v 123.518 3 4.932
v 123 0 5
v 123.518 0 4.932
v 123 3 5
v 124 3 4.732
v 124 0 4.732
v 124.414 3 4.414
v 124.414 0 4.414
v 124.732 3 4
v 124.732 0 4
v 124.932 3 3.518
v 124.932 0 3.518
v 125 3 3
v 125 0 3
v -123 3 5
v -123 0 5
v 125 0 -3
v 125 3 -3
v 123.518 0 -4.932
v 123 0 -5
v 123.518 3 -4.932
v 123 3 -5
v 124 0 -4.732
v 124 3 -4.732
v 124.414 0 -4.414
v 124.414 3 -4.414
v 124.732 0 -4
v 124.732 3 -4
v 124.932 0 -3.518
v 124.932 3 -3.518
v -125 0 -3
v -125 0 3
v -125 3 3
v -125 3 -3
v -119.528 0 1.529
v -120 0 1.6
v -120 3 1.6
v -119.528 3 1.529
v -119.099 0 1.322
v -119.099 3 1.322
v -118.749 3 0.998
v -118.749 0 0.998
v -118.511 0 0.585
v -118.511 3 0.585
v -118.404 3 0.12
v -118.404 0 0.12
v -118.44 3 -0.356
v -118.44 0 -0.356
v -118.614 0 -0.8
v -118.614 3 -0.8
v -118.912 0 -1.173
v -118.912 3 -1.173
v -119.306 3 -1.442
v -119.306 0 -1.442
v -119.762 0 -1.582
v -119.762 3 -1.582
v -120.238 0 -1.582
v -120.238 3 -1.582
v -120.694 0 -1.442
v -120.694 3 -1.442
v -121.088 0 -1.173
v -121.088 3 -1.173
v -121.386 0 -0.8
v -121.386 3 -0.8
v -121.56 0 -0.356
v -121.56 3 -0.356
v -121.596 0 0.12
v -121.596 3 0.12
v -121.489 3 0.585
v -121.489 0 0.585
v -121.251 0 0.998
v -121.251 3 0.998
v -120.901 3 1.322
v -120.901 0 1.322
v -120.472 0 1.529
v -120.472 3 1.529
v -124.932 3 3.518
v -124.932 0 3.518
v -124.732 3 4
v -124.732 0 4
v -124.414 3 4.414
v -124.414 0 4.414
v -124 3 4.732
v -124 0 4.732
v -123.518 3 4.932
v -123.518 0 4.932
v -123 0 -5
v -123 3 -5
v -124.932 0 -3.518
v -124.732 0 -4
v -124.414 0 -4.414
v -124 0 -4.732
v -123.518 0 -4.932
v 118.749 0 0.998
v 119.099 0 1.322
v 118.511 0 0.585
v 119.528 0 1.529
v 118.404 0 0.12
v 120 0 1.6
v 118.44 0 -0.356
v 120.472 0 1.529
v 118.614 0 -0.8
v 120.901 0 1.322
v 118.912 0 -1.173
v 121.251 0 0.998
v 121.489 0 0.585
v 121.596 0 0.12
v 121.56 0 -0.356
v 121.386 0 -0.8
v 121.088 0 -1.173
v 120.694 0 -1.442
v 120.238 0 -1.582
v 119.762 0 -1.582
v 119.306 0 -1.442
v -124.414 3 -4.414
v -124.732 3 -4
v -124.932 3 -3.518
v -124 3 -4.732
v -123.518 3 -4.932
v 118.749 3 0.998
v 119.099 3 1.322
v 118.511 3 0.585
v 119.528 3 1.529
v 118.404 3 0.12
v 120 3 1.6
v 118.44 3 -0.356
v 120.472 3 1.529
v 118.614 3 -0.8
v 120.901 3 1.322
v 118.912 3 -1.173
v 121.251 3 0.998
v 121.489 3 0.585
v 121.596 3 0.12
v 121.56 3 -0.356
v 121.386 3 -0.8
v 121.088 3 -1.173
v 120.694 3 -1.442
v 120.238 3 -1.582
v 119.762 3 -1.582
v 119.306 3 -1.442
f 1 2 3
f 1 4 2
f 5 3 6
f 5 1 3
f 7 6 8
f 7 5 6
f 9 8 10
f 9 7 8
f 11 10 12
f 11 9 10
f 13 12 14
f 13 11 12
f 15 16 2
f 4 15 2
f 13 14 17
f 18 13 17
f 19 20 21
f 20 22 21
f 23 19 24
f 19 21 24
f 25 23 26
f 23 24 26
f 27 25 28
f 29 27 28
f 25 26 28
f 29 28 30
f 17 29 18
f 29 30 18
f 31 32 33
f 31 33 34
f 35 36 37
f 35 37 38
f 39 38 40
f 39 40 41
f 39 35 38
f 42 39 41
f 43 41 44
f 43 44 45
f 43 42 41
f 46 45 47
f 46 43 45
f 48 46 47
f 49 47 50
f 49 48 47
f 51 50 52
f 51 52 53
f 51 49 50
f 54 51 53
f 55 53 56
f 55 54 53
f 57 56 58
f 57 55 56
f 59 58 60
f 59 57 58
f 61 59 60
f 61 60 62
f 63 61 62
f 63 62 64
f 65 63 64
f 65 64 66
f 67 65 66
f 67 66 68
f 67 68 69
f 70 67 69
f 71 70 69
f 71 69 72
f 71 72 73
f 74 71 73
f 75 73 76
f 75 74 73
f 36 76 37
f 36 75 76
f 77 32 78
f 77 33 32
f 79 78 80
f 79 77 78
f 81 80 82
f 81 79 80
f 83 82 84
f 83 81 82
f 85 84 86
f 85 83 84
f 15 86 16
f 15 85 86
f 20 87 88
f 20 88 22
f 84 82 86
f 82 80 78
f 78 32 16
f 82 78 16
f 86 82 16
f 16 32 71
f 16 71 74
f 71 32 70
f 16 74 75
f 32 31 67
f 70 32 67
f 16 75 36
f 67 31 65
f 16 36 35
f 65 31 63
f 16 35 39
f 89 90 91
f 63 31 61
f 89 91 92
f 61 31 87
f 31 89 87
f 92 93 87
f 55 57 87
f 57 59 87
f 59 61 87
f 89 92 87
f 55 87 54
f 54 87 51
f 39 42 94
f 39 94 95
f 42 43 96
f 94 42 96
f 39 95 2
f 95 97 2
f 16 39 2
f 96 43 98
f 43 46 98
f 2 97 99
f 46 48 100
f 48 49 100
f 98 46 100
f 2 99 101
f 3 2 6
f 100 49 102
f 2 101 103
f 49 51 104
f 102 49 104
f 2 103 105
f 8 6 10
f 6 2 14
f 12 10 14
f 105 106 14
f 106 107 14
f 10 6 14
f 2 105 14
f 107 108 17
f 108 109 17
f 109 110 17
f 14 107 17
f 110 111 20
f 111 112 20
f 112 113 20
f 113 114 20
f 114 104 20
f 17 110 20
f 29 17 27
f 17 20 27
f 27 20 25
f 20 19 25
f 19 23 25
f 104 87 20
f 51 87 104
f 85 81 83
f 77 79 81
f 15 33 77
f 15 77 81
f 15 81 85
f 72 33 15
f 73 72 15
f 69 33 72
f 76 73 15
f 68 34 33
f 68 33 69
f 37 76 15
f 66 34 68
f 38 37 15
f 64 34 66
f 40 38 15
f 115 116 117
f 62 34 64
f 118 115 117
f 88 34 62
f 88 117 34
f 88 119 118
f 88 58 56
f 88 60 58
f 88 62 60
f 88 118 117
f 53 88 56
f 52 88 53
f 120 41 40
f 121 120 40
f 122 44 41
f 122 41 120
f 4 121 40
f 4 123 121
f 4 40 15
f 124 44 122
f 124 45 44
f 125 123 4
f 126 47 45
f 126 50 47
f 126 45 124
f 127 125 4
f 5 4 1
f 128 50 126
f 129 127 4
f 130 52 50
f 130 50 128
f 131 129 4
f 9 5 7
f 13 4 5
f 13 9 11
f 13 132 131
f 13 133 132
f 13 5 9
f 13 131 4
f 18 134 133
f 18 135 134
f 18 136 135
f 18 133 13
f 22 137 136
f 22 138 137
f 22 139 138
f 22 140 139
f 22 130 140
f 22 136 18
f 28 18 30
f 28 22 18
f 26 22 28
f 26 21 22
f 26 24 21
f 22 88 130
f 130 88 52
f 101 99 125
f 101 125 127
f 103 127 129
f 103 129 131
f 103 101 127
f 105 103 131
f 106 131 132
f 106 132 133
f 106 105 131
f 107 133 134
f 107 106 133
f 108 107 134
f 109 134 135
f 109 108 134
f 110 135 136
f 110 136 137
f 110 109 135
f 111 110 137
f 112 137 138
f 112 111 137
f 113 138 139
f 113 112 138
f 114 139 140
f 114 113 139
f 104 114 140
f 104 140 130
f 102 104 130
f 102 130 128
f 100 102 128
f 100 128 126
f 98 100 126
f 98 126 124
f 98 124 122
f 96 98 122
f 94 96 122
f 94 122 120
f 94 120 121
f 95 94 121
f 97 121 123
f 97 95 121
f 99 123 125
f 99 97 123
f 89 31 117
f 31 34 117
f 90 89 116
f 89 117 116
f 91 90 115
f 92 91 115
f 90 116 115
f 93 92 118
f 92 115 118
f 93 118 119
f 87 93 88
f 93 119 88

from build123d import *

# Parameters (mm, degrees)
SKETCH_1_W      = 250
SKETCH_1_H      = 10
SKETCH_1_R      = 1.6
EXTRUDE_1_DEPTH = 3
FILLET_2_R      = 2
FILLET_3_R      = 2


with BuildPart() as part:
    # 草图1 → 凸台-拉伸1 (new body)
    with BuildSketch(Plane(origin=(0, 0, 0), x_dir=(1, 0, 0), z_dir=(0, 1, 0))):
        Rectangle(SKETCH_1_W, SKETCH_1_H)
        with Locations(Location((-120, 0, 0), (0, 0, 270))):
            Circle(SKETCH_1_R, mode=Mode.SUBTRACT)
        with Locations(Location((120, 0, 0), (0, 0, 270))):
            Circle(SKETCH_1_R, mode=Mode.SUBTRACT)
    extrude(amount=EXTRUDE_1_DEPTH)

    # 圆角2
    fillet_2_edges = [part.edges().sort_by_distance(p)[0] for p in [
        (-125, 1.5, 5),
    ]]
    fillet(fillet_2_edges, radius=FILLET_2_R)

    # 圆角3
    fillet_3_edges = [part.edges().sort_by_distance(p)[0] for p in [
        (125, 1.5, 5),
        (-125, 1.5, -5),
        (125, 1.5, -5),
    ]]
    fillet(fillet_3_edges, radius=FILLET_3_R)


solid = part.part
